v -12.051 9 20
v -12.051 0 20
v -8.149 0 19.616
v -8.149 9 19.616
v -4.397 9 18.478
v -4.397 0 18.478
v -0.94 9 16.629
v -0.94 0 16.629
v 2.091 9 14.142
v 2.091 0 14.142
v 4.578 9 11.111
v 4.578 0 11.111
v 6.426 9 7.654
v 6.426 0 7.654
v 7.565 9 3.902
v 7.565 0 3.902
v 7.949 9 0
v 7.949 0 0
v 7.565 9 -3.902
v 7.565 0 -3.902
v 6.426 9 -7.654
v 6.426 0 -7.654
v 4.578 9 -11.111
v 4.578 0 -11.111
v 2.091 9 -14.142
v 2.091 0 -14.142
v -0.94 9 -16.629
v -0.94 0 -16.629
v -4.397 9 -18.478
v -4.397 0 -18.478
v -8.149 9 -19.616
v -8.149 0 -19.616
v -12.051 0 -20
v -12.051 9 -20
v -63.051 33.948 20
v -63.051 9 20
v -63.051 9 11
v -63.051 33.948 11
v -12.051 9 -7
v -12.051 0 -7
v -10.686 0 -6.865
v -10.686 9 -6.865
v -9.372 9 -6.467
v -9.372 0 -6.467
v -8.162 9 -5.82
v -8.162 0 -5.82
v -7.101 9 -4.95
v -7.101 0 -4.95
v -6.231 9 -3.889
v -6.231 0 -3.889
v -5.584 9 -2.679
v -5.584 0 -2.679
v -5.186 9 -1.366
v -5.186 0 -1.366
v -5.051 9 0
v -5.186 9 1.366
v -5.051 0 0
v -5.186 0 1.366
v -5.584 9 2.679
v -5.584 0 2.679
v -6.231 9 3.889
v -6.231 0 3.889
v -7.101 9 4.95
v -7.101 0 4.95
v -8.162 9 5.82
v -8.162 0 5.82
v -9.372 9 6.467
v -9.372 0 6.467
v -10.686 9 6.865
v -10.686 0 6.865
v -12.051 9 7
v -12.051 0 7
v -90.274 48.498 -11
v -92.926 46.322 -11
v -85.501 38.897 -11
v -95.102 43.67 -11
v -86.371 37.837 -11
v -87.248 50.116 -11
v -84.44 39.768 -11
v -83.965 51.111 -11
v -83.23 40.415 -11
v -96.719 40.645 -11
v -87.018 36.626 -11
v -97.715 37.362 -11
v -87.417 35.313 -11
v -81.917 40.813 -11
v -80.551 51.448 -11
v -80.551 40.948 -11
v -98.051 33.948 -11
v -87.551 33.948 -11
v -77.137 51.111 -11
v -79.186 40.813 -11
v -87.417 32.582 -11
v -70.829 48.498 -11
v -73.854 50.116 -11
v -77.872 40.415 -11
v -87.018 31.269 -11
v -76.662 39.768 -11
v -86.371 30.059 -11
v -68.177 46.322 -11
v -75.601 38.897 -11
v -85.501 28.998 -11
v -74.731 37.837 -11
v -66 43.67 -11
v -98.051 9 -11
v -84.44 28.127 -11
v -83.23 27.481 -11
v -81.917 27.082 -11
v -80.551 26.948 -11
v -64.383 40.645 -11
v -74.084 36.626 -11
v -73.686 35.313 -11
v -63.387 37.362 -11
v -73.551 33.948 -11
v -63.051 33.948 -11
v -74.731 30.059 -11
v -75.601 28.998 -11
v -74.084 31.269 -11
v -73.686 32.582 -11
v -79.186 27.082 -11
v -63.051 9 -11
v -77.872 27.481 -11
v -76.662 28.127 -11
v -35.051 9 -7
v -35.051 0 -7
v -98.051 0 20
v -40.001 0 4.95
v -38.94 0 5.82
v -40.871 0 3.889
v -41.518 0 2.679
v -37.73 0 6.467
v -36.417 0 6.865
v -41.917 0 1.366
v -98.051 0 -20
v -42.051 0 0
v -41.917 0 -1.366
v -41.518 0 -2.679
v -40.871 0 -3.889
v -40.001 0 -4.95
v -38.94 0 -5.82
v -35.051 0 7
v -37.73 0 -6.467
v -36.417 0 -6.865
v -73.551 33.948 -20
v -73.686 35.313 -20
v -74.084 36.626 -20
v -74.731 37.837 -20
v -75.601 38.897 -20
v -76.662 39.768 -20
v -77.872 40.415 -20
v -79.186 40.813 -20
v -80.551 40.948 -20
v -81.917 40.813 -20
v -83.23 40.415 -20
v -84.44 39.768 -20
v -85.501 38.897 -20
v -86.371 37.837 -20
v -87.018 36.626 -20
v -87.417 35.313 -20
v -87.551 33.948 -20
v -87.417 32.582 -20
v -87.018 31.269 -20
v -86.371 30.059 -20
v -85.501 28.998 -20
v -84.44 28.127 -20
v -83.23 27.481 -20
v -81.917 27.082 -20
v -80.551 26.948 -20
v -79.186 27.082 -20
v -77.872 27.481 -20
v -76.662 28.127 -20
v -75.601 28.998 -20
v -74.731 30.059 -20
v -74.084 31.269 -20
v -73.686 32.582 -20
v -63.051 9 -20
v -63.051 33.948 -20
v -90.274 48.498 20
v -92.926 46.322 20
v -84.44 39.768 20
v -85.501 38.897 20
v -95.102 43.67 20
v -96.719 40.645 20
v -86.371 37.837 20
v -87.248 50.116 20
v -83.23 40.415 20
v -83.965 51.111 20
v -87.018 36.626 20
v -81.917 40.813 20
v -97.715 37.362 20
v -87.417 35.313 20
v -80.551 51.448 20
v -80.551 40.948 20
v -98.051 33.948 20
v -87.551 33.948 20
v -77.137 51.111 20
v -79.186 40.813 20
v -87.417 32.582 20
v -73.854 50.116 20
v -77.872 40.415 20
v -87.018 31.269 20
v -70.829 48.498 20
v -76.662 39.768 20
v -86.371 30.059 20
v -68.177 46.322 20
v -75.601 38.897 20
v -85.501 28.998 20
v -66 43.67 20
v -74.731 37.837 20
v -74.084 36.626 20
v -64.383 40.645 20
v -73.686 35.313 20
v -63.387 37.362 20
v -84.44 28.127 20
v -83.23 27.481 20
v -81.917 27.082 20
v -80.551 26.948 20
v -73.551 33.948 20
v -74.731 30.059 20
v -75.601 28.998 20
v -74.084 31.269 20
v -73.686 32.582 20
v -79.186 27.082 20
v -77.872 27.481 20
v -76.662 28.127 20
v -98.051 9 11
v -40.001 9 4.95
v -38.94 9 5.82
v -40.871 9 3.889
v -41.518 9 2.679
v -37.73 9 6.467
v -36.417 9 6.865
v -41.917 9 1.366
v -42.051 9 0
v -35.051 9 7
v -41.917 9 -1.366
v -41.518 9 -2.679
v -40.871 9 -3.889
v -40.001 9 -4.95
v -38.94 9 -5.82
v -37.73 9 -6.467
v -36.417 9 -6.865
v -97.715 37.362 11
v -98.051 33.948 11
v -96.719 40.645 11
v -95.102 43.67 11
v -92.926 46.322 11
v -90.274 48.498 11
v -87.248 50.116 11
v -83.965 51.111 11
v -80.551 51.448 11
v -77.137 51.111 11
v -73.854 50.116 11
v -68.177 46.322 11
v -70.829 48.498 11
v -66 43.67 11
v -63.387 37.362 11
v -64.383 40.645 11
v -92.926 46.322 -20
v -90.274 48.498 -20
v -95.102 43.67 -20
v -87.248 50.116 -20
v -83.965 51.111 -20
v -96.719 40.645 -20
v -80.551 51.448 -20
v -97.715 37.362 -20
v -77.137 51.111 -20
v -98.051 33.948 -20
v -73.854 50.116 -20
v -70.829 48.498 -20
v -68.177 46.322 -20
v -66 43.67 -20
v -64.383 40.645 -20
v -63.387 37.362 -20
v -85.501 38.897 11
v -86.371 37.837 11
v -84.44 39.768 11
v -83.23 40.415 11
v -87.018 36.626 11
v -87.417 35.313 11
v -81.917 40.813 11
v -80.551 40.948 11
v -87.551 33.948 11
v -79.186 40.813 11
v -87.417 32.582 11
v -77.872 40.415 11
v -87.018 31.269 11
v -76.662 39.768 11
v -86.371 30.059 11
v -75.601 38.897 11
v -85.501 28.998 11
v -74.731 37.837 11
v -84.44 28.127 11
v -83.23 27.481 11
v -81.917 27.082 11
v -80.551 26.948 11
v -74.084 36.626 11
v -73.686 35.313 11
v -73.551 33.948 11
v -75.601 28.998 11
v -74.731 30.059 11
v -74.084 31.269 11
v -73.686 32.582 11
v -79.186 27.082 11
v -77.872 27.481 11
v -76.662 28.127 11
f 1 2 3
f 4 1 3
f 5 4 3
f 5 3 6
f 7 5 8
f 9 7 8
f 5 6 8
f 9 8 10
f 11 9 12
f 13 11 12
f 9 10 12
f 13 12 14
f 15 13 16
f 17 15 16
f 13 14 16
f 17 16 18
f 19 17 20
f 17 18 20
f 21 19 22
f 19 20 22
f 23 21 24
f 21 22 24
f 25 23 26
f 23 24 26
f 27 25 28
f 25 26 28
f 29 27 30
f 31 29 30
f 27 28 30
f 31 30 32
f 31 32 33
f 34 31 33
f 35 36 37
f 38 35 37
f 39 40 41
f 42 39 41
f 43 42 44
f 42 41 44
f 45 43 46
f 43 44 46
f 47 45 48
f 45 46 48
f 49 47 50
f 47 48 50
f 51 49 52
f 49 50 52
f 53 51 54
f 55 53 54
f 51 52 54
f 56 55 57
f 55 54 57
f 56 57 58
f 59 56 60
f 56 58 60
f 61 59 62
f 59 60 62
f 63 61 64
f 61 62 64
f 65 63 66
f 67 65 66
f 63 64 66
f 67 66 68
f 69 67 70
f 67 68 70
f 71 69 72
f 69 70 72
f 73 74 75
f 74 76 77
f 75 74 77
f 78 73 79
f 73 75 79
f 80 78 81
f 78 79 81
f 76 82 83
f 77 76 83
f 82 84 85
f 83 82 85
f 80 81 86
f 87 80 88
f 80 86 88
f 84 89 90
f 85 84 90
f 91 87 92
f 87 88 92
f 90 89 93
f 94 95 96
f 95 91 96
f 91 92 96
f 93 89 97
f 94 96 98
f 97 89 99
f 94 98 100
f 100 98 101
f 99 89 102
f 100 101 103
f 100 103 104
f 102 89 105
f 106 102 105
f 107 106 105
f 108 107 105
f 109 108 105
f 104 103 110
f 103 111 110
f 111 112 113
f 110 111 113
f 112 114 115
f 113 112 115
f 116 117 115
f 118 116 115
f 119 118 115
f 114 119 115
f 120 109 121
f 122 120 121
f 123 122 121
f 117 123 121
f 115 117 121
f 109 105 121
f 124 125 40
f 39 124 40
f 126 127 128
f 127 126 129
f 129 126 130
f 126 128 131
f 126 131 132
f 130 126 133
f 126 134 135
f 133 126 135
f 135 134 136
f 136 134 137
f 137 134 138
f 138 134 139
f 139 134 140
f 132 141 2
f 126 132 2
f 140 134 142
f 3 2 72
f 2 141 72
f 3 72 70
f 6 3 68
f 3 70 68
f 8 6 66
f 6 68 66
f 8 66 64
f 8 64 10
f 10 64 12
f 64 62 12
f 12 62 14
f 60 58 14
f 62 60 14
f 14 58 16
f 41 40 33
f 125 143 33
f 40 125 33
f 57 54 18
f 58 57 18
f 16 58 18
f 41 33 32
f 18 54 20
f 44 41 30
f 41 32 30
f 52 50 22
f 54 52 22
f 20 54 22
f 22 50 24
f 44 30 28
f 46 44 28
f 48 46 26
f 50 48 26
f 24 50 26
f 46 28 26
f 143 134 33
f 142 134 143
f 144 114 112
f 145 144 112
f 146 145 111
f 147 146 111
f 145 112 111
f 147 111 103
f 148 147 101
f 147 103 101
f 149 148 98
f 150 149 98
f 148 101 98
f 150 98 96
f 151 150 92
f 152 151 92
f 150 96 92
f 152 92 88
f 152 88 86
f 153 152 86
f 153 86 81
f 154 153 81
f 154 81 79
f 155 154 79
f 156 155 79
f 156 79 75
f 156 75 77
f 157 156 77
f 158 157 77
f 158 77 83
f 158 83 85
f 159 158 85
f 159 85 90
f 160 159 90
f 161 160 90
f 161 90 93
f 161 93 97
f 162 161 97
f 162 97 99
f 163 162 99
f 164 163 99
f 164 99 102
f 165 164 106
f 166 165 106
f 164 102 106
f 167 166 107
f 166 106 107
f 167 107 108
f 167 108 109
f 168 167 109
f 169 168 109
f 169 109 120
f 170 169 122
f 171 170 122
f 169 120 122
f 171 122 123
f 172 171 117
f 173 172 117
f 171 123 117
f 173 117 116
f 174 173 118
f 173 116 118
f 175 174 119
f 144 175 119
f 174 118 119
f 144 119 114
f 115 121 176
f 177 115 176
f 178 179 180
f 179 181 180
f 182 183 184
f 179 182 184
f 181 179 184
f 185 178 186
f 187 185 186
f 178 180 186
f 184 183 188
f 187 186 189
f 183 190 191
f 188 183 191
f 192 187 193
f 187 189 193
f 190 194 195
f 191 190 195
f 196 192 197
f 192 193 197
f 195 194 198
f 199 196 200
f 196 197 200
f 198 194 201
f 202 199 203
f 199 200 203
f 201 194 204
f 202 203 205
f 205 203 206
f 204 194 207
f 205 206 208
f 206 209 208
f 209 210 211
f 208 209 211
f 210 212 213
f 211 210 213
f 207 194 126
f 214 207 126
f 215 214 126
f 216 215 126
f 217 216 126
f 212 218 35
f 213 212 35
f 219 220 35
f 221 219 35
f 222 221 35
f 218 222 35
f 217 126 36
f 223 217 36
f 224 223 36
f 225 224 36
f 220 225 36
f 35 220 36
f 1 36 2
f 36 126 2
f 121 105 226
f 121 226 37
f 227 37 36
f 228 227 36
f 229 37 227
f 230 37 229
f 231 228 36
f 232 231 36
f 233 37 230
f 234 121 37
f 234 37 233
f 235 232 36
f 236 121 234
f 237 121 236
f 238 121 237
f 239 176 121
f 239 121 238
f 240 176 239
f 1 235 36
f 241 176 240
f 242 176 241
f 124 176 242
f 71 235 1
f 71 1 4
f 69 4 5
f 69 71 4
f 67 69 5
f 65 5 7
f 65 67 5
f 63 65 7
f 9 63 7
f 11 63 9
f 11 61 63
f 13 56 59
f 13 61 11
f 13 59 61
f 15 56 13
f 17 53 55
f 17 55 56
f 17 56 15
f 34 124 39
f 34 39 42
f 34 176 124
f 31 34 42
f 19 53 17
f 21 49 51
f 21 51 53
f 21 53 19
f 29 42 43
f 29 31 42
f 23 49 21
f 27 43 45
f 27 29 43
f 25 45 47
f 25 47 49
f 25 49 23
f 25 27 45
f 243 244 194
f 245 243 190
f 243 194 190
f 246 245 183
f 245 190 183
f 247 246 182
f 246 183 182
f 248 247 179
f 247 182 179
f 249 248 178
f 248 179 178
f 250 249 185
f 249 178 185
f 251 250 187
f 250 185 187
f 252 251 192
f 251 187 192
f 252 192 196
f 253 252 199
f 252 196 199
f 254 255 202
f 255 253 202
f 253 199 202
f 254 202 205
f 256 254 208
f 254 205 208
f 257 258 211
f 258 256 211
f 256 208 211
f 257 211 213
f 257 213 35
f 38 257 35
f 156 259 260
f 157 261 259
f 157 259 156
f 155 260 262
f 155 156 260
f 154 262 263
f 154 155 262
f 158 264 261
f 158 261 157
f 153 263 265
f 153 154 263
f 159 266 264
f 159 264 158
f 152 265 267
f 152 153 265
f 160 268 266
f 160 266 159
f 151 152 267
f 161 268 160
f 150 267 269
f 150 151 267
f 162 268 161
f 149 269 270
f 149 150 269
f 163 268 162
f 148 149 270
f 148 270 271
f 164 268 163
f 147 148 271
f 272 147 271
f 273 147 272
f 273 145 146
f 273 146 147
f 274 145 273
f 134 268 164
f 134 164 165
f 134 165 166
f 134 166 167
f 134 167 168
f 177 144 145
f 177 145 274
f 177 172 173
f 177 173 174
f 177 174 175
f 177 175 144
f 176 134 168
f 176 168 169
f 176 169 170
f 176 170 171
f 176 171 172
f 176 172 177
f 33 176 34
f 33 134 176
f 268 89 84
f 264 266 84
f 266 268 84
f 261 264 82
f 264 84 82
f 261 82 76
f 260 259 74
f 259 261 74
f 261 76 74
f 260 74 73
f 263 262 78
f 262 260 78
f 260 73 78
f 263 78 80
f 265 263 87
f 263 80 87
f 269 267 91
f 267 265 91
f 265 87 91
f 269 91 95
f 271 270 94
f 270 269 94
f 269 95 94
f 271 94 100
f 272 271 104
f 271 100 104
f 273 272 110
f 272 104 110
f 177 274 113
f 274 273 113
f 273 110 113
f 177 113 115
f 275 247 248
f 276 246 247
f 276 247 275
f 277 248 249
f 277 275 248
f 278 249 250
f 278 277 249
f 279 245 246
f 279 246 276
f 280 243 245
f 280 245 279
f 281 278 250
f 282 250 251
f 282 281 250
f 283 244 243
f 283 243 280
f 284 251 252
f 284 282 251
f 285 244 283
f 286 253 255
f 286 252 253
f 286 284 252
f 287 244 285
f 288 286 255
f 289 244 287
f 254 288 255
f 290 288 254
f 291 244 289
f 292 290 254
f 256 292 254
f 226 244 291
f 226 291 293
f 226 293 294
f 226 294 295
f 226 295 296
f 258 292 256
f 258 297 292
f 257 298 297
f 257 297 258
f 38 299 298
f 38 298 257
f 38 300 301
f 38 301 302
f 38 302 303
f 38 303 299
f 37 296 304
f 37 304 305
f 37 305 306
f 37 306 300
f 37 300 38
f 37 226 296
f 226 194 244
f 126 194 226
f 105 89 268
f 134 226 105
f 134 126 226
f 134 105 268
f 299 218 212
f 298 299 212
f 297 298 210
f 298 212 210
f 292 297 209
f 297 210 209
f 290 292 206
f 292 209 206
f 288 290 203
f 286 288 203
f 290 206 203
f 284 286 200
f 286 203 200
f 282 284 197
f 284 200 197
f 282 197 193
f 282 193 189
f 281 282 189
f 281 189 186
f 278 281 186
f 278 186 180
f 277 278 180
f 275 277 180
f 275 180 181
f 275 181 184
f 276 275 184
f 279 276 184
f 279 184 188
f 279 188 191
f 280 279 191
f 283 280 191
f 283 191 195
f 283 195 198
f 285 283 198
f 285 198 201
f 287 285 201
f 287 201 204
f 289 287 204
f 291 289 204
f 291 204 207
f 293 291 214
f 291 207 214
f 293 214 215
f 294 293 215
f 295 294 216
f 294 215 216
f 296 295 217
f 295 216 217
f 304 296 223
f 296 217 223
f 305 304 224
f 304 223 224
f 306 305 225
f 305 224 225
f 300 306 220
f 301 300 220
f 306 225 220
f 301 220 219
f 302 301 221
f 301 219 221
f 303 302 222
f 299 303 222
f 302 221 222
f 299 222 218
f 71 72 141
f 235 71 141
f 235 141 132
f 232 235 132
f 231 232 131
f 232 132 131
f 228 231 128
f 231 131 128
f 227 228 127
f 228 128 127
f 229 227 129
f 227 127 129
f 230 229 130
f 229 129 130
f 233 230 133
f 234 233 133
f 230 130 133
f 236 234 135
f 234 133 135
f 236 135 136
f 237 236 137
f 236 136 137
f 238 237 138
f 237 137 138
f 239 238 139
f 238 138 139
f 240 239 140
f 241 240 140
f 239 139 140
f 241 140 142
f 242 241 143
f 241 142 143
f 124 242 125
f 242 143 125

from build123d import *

# Parameters (mm, degrees)
BOSS_EXTRUDE1_DEPTH = 9
SKETCH2_3_W         = 35
SKETCH2_3_H         = 9
BOSS_EXTRUDE2_DEPTH = 55.5
SKETCH3_R           = 7
CUT_EXTRUDE1_DEPTH  = 55.5


with BuildPart() as part:
    # Sketch2 → Boss-Extrude1 (new body)
    with BuildSketch(Plane(origin=(0, 0, 0), x_dir=(1, 0, 0), z_dir=(0, 1, 0))):
        with BuildLine():
            Line((-12.051133951, 20), (-63.051133951, 20))
            Line((-63.051133951, 20), (-63.051133951, 11))
            Line((-63.051133951, 11), (-98.051133951, 11))
            Line((-98.051133951, 11), (-98.051133951, -11))
            Line((-98.051133951, -11), (-63.051133951, -11))
            Line((-63.051133951, -11), (-63.051133951, -20))
            Line((-63.051133951, -20), (-12.051133951, -20))
            ThreePointArc((-12.051133951, -20), (7.948866049, 0), (-12.051133951, 20))
        make_face()
        with BuildLine():
            ThreePointArc((-12.051133951, 7), (-5.051133951, 0), (-12.051133951, -7))
            Line((-12.051133951, -7), (-35.051133951, -7))
            ThreePointArc((-35.051133951, -7), (-42.051133951, 0), (-35.051133951, 7))
            Line((-35.051133951, 7), (-12.051133951, 7))
        make_face(mode=Mode.SUBTRACT)
    extrude(amount=BOSS_EXTRUDE1_DEPTH)

    # Sketch2<3> → Boss-Extrude2 (add)
    with BuildSketch(Plane(origin=(0, 0, 0), x_dir=(1, 0, 0), z_dir=(0, 1, 0))):
        with Locations((-80.551133951, 15.5)):
            Rectangle(SKETCH2_3_W, SKETCH2_3_H)
        with Locations((-80.551133951, -15.5)):
            Rectangle(SKETCH2_3_W, SKETCH2_3_H)
    extrude(amount=BOSS_EXTRUDE2_DEPTH)

    # Sketch3 → Cut-Extrude1 (cut)
    with BuildSketch(Plane.XY.offset(20)):
        with BuildLine():
            ThreePointArc((-98.051133951, 33.947689481), (-80.551133951, 51.447689481), (-63.051133951, 33.947689481))
            Line((-63.051133951, 33.947689481), (-63.051133951, 55.5))
            Line((-63.051133951, 55.5), (-98.051133951, 55.5))
            Line((-98.051133951, 55.5), (-98.051133951, 33.947689481))
        make_face()
        with Locations((-80.551133951, 33.947689481)):
            Circle(SKETCH3_R)
    extrude(amount=-CUT_EXTRUDE1_DEPTH, mode=Mode.SUBTRACT)


solid = part.part
